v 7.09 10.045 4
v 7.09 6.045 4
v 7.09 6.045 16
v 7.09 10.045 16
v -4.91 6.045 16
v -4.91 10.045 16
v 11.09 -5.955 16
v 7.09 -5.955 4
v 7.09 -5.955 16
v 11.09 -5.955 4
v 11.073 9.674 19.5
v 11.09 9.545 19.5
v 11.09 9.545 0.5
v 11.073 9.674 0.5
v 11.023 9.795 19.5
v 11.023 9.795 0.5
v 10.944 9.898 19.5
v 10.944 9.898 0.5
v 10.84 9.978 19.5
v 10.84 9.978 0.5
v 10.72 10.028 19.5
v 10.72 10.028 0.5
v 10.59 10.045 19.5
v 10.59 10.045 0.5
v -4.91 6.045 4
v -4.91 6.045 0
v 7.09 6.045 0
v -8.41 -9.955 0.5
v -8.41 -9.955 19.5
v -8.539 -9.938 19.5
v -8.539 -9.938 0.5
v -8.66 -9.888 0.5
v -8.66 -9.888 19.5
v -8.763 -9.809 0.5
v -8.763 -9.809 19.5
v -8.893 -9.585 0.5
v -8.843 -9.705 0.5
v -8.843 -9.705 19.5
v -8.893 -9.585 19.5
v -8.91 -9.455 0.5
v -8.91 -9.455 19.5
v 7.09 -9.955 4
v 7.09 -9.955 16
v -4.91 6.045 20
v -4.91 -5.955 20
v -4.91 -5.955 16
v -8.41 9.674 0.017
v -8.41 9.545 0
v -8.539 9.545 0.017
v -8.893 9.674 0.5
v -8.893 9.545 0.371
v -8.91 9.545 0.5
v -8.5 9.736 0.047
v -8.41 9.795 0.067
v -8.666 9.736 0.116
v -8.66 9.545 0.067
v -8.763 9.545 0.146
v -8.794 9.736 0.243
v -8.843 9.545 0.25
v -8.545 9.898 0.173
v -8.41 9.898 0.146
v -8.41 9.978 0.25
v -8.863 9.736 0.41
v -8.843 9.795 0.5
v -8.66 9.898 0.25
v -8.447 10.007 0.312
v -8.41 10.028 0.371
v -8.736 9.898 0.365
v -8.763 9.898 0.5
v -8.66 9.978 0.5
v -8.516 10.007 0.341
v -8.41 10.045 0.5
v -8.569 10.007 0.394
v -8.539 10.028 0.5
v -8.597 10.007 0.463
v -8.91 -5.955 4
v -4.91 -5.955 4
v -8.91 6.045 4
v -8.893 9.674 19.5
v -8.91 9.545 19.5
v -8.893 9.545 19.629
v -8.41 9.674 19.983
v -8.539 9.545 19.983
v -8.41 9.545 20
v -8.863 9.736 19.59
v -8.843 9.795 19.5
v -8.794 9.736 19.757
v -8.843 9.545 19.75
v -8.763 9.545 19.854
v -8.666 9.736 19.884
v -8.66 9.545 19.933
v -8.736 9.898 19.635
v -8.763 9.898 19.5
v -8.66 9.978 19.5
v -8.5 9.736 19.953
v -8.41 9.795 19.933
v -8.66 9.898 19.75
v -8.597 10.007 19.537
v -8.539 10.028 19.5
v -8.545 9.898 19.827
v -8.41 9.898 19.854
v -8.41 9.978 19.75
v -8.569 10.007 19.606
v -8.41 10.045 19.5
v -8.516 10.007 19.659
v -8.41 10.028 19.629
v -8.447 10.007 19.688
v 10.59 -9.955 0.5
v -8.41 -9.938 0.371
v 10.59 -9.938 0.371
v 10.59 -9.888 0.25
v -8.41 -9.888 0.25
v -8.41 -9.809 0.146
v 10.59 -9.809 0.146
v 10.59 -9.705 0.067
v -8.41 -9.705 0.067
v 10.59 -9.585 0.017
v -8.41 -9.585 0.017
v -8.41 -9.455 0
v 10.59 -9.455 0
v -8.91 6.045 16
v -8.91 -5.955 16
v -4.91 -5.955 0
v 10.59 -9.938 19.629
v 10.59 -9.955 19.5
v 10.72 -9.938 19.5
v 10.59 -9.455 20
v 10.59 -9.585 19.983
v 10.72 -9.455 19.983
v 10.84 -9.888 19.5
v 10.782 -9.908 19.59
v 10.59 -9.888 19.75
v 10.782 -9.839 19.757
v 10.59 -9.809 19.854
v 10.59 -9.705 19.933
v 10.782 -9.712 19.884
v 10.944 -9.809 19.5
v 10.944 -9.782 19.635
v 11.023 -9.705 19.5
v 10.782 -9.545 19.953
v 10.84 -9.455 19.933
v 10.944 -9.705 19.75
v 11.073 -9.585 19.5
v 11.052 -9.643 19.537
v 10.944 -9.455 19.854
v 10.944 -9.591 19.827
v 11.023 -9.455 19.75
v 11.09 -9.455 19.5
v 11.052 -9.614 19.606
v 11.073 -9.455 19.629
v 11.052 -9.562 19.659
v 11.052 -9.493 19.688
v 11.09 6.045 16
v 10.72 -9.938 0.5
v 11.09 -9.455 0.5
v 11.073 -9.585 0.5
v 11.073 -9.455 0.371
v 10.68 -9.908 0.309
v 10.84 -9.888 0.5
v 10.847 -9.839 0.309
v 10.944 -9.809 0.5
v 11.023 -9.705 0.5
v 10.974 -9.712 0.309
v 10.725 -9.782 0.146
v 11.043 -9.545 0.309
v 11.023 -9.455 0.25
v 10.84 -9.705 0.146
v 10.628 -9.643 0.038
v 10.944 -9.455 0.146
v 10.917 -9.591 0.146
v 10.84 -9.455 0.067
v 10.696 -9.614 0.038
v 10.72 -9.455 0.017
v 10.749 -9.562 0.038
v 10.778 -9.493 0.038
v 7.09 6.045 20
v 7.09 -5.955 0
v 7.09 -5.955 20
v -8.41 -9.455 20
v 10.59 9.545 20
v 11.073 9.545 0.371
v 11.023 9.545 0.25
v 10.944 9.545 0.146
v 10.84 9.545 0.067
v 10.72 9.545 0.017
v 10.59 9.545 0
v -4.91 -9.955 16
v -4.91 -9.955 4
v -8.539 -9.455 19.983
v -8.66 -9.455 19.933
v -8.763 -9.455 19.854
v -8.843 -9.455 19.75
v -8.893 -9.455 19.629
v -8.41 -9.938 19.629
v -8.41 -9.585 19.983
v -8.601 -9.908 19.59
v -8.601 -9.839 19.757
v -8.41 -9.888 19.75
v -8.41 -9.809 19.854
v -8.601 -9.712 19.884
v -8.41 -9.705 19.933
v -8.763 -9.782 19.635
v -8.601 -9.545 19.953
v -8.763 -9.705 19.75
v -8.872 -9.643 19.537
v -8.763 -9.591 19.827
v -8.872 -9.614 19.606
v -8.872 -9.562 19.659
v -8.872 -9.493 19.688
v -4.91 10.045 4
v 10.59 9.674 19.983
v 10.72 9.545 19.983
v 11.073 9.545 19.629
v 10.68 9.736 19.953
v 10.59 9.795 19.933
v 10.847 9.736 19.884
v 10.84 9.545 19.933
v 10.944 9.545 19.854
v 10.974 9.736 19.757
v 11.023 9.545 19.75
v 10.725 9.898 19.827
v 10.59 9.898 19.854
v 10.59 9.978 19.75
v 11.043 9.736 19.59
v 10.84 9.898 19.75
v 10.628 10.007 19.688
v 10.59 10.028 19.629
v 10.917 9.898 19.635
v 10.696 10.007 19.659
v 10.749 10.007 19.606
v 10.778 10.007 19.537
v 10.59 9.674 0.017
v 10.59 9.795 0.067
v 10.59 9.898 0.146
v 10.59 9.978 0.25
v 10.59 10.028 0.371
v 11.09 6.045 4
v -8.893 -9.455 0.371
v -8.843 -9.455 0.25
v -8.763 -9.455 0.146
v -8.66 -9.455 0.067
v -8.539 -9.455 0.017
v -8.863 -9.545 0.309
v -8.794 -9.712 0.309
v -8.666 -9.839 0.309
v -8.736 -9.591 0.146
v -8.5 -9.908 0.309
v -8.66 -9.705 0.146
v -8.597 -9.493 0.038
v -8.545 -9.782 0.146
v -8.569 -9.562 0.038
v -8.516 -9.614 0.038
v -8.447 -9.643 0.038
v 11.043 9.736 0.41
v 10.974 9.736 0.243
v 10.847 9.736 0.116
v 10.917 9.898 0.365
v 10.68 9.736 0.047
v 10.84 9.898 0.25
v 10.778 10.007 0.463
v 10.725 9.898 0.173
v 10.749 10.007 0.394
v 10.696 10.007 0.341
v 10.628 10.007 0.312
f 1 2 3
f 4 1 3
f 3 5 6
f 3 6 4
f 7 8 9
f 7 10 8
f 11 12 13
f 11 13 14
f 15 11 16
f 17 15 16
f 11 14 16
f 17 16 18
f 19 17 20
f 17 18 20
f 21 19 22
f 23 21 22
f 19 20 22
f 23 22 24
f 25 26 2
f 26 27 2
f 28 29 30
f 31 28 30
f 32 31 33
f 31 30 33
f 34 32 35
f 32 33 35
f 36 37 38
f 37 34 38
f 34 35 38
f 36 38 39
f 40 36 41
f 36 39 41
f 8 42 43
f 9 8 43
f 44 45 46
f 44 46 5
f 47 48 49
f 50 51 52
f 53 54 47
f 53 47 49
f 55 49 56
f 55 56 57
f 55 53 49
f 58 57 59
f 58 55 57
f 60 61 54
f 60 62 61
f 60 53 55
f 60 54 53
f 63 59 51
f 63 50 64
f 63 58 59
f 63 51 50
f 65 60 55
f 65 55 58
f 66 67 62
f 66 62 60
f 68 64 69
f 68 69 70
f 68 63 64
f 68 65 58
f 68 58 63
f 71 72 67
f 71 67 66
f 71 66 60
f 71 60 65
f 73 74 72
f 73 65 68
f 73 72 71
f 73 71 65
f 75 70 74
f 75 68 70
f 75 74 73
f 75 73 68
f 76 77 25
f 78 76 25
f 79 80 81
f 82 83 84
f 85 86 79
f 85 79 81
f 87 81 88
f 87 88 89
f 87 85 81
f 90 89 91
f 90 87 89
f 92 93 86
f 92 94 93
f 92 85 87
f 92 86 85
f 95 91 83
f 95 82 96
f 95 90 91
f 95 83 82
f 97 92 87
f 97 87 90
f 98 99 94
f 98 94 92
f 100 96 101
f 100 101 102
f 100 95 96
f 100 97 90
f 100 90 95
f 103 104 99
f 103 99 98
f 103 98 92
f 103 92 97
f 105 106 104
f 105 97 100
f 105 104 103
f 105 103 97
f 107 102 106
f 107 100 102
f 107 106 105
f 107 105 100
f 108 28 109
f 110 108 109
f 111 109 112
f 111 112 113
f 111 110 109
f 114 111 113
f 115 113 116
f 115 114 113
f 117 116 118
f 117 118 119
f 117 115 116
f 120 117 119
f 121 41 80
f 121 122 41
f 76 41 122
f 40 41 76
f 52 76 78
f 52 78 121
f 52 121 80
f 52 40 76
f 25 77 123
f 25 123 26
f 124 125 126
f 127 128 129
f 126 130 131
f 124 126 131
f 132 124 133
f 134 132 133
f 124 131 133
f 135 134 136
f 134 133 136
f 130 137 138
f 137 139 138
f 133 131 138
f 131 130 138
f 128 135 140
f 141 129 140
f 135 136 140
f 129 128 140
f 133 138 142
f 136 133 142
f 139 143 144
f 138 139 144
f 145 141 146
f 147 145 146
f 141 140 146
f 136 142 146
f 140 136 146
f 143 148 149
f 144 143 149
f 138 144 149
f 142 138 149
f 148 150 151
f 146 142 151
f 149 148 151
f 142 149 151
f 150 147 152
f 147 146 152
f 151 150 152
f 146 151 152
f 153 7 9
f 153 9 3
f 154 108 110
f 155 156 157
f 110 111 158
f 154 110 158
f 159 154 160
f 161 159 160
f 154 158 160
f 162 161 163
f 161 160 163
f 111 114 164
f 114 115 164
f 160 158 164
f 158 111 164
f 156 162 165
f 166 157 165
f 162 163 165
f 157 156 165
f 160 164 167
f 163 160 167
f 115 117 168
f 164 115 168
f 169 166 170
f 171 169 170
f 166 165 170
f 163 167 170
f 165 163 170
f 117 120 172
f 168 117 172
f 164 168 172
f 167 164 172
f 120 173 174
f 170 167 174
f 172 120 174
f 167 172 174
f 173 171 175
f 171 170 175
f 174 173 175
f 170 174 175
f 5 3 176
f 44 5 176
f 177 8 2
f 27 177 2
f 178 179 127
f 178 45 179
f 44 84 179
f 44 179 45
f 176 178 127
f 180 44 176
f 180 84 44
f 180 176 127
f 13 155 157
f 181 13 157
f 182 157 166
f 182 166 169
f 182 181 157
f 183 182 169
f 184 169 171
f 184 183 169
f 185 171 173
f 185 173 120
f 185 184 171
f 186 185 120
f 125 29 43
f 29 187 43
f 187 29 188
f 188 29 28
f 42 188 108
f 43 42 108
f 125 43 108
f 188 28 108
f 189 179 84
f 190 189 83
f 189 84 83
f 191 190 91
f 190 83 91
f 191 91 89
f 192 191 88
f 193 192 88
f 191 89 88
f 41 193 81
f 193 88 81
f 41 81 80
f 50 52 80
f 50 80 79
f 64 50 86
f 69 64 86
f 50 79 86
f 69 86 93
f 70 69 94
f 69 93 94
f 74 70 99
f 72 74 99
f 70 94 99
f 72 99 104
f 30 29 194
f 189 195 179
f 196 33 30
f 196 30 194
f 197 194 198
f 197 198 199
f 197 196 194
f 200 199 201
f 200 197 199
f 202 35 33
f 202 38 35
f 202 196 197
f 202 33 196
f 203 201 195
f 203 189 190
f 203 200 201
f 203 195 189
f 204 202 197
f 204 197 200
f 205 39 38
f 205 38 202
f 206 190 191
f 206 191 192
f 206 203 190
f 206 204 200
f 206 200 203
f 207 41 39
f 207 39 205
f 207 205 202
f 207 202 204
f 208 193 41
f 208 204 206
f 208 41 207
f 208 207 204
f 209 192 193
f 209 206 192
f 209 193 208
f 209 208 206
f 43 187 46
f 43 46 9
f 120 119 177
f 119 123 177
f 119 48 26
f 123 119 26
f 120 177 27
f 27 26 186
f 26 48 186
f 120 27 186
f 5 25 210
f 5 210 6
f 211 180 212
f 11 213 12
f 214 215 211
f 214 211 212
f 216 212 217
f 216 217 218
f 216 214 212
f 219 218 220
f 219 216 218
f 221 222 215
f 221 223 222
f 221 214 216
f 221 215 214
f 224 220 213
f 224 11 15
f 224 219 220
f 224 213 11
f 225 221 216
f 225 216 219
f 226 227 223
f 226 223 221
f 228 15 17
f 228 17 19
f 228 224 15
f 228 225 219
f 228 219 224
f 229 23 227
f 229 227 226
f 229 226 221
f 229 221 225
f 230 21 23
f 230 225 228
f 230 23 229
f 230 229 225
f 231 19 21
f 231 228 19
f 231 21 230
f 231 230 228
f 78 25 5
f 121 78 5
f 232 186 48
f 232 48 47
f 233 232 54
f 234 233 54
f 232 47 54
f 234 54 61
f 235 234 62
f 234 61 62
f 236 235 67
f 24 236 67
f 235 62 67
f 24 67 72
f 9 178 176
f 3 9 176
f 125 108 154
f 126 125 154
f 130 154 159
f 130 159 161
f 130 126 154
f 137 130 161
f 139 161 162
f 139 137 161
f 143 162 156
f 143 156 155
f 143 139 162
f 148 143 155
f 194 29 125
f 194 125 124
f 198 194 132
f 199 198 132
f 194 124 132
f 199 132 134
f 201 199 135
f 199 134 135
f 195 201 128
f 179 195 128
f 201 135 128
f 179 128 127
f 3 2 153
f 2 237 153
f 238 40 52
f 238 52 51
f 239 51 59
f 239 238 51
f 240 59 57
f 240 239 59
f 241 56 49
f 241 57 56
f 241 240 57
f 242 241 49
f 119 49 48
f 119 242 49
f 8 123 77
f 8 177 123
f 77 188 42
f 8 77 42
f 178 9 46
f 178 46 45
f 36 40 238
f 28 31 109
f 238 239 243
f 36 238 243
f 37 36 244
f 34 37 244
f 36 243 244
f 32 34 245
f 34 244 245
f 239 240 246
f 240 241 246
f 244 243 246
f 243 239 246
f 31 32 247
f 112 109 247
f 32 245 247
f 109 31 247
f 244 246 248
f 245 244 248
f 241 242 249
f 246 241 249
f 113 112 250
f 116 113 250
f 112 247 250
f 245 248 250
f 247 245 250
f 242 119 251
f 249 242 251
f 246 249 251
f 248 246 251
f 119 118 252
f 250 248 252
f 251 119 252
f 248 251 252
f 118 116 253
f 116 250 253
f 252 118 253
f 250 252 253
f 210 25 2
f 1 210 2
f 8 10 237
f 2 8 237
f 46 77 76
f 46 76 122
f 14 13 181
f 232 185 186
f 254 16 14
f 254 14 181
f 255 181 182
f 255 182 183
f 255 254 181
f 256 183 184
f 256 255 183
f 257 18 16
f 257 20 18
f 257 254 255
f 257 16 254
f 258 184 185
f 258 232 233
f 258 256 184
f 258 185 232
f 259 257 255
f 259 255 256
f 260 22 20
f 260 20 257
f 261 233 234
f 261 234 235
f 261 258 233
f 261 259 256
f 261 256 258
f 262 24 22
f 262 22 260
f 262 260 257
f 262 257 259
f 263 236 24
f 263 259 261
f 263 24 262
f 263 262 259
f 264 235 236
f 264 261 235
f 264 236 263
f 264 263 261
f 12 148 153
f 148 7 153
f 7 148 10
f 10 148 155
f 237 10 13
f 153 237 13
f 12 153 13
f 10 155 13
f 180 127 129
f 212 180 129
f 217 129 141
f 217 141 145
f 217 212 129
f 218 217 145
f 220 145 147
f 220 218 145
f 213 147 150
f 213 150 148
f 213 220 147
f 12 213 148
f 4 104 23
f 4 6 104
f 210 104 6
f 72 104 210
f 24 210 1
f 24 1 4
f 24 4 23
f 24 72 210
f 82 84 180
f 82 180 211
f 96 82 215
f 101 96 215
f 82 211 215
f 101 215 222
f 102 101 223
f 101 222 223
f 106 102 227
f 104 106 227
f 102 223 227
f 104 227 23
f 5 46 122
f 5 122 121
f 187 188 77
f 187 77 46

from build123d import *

# Parameters (mm, degrees)
F0_W     = 20
F0_H     = 20
F1_DEPTH = 20
F2_W     = 12
F2_H     = 12
F3_DEPTH = 25
F4_W     = 12
F4_H     = 12
F5_DEPTH = 25
F6_W     = 12
F6_H     = 12
F7_DEPTH = 25
F8_R     = 0.5
F9_R     = 0.5
F10_R    = 0.5
F11_R    = 0.5
F12_R    = 0.5


with BuildPart() as f1:
    # F0 (on Top) → F1 (new body)
    with BuildSketch(Plane.XY):
        with Locations((1.090192, 0.044756)):
            Rectangle(F0_W, F0_H)
    extrude(amount=F1_DEPTH)

    # F2 (on face) → F3 (cut)
    with BuildSketch(Plane.XY.offset(20)):
        with Locations((1.090192, 0.044756)):
            Rectangle(F2_W, F2_H)
    extrude(amount=-F3_DEPTH, mode=Mode.SUBTRACT)

    # F4 (on face) → F5 (cut)
    with BuildSketch(Plane.YZ.offset(11.090192)):
        with Locations((0.044756, 10)):
            Rectangle(F4_W, F4_H)
    extrude(amount=-F5_DEPTH, mode=Mode.SUBTRACT)

    # F6 (on face) → F7 (cut)
    with BuildSketch(Plane.XZ.offset(9.955244)):
        with Locations((1.090192, 10)):
            Rectangle(F6_W, F6_H)
    extrude(amount=-F7_DEPTH, mode=Mode.SUBTRACT)

    # F8
    f8_edges = [f1.edges().sort_by_distance(p)[0] for p in [
        (1.090192, -9.955244, 20),
    ]]
    fillet(f8_edges, radius=F8_R)

    # F9
    f9_edges = [f1.edges().sort_by_distance(p)[0] for p in [
        (11.090192, 0.294756, 20),
    ]]
    fillet(f9_edges, radius=F9_R)

    # F10
    f10_edges = [f1.edges().sort_by_distance(p)[0] for p in [
        (-8.909808, -9.955244, 9.75),
    ]]
    fillet(f10_edges, radius=F10_R)

    # F11
    f11_edges = [f1.edges().sort_by_distance(p)[0] for p in [
        (1.090192, -9.955244, 0),
    ]]
    fillet(f11_edges, radius=F11_R)

    # F12
    f12_edges = [f1.edges().sort_by_distance(p)[0] for p in [
        (-8.909808, 10.044756, 10),
    ]]
    fillet(f12_edges, radius=F12_R)


solid = f1.part
